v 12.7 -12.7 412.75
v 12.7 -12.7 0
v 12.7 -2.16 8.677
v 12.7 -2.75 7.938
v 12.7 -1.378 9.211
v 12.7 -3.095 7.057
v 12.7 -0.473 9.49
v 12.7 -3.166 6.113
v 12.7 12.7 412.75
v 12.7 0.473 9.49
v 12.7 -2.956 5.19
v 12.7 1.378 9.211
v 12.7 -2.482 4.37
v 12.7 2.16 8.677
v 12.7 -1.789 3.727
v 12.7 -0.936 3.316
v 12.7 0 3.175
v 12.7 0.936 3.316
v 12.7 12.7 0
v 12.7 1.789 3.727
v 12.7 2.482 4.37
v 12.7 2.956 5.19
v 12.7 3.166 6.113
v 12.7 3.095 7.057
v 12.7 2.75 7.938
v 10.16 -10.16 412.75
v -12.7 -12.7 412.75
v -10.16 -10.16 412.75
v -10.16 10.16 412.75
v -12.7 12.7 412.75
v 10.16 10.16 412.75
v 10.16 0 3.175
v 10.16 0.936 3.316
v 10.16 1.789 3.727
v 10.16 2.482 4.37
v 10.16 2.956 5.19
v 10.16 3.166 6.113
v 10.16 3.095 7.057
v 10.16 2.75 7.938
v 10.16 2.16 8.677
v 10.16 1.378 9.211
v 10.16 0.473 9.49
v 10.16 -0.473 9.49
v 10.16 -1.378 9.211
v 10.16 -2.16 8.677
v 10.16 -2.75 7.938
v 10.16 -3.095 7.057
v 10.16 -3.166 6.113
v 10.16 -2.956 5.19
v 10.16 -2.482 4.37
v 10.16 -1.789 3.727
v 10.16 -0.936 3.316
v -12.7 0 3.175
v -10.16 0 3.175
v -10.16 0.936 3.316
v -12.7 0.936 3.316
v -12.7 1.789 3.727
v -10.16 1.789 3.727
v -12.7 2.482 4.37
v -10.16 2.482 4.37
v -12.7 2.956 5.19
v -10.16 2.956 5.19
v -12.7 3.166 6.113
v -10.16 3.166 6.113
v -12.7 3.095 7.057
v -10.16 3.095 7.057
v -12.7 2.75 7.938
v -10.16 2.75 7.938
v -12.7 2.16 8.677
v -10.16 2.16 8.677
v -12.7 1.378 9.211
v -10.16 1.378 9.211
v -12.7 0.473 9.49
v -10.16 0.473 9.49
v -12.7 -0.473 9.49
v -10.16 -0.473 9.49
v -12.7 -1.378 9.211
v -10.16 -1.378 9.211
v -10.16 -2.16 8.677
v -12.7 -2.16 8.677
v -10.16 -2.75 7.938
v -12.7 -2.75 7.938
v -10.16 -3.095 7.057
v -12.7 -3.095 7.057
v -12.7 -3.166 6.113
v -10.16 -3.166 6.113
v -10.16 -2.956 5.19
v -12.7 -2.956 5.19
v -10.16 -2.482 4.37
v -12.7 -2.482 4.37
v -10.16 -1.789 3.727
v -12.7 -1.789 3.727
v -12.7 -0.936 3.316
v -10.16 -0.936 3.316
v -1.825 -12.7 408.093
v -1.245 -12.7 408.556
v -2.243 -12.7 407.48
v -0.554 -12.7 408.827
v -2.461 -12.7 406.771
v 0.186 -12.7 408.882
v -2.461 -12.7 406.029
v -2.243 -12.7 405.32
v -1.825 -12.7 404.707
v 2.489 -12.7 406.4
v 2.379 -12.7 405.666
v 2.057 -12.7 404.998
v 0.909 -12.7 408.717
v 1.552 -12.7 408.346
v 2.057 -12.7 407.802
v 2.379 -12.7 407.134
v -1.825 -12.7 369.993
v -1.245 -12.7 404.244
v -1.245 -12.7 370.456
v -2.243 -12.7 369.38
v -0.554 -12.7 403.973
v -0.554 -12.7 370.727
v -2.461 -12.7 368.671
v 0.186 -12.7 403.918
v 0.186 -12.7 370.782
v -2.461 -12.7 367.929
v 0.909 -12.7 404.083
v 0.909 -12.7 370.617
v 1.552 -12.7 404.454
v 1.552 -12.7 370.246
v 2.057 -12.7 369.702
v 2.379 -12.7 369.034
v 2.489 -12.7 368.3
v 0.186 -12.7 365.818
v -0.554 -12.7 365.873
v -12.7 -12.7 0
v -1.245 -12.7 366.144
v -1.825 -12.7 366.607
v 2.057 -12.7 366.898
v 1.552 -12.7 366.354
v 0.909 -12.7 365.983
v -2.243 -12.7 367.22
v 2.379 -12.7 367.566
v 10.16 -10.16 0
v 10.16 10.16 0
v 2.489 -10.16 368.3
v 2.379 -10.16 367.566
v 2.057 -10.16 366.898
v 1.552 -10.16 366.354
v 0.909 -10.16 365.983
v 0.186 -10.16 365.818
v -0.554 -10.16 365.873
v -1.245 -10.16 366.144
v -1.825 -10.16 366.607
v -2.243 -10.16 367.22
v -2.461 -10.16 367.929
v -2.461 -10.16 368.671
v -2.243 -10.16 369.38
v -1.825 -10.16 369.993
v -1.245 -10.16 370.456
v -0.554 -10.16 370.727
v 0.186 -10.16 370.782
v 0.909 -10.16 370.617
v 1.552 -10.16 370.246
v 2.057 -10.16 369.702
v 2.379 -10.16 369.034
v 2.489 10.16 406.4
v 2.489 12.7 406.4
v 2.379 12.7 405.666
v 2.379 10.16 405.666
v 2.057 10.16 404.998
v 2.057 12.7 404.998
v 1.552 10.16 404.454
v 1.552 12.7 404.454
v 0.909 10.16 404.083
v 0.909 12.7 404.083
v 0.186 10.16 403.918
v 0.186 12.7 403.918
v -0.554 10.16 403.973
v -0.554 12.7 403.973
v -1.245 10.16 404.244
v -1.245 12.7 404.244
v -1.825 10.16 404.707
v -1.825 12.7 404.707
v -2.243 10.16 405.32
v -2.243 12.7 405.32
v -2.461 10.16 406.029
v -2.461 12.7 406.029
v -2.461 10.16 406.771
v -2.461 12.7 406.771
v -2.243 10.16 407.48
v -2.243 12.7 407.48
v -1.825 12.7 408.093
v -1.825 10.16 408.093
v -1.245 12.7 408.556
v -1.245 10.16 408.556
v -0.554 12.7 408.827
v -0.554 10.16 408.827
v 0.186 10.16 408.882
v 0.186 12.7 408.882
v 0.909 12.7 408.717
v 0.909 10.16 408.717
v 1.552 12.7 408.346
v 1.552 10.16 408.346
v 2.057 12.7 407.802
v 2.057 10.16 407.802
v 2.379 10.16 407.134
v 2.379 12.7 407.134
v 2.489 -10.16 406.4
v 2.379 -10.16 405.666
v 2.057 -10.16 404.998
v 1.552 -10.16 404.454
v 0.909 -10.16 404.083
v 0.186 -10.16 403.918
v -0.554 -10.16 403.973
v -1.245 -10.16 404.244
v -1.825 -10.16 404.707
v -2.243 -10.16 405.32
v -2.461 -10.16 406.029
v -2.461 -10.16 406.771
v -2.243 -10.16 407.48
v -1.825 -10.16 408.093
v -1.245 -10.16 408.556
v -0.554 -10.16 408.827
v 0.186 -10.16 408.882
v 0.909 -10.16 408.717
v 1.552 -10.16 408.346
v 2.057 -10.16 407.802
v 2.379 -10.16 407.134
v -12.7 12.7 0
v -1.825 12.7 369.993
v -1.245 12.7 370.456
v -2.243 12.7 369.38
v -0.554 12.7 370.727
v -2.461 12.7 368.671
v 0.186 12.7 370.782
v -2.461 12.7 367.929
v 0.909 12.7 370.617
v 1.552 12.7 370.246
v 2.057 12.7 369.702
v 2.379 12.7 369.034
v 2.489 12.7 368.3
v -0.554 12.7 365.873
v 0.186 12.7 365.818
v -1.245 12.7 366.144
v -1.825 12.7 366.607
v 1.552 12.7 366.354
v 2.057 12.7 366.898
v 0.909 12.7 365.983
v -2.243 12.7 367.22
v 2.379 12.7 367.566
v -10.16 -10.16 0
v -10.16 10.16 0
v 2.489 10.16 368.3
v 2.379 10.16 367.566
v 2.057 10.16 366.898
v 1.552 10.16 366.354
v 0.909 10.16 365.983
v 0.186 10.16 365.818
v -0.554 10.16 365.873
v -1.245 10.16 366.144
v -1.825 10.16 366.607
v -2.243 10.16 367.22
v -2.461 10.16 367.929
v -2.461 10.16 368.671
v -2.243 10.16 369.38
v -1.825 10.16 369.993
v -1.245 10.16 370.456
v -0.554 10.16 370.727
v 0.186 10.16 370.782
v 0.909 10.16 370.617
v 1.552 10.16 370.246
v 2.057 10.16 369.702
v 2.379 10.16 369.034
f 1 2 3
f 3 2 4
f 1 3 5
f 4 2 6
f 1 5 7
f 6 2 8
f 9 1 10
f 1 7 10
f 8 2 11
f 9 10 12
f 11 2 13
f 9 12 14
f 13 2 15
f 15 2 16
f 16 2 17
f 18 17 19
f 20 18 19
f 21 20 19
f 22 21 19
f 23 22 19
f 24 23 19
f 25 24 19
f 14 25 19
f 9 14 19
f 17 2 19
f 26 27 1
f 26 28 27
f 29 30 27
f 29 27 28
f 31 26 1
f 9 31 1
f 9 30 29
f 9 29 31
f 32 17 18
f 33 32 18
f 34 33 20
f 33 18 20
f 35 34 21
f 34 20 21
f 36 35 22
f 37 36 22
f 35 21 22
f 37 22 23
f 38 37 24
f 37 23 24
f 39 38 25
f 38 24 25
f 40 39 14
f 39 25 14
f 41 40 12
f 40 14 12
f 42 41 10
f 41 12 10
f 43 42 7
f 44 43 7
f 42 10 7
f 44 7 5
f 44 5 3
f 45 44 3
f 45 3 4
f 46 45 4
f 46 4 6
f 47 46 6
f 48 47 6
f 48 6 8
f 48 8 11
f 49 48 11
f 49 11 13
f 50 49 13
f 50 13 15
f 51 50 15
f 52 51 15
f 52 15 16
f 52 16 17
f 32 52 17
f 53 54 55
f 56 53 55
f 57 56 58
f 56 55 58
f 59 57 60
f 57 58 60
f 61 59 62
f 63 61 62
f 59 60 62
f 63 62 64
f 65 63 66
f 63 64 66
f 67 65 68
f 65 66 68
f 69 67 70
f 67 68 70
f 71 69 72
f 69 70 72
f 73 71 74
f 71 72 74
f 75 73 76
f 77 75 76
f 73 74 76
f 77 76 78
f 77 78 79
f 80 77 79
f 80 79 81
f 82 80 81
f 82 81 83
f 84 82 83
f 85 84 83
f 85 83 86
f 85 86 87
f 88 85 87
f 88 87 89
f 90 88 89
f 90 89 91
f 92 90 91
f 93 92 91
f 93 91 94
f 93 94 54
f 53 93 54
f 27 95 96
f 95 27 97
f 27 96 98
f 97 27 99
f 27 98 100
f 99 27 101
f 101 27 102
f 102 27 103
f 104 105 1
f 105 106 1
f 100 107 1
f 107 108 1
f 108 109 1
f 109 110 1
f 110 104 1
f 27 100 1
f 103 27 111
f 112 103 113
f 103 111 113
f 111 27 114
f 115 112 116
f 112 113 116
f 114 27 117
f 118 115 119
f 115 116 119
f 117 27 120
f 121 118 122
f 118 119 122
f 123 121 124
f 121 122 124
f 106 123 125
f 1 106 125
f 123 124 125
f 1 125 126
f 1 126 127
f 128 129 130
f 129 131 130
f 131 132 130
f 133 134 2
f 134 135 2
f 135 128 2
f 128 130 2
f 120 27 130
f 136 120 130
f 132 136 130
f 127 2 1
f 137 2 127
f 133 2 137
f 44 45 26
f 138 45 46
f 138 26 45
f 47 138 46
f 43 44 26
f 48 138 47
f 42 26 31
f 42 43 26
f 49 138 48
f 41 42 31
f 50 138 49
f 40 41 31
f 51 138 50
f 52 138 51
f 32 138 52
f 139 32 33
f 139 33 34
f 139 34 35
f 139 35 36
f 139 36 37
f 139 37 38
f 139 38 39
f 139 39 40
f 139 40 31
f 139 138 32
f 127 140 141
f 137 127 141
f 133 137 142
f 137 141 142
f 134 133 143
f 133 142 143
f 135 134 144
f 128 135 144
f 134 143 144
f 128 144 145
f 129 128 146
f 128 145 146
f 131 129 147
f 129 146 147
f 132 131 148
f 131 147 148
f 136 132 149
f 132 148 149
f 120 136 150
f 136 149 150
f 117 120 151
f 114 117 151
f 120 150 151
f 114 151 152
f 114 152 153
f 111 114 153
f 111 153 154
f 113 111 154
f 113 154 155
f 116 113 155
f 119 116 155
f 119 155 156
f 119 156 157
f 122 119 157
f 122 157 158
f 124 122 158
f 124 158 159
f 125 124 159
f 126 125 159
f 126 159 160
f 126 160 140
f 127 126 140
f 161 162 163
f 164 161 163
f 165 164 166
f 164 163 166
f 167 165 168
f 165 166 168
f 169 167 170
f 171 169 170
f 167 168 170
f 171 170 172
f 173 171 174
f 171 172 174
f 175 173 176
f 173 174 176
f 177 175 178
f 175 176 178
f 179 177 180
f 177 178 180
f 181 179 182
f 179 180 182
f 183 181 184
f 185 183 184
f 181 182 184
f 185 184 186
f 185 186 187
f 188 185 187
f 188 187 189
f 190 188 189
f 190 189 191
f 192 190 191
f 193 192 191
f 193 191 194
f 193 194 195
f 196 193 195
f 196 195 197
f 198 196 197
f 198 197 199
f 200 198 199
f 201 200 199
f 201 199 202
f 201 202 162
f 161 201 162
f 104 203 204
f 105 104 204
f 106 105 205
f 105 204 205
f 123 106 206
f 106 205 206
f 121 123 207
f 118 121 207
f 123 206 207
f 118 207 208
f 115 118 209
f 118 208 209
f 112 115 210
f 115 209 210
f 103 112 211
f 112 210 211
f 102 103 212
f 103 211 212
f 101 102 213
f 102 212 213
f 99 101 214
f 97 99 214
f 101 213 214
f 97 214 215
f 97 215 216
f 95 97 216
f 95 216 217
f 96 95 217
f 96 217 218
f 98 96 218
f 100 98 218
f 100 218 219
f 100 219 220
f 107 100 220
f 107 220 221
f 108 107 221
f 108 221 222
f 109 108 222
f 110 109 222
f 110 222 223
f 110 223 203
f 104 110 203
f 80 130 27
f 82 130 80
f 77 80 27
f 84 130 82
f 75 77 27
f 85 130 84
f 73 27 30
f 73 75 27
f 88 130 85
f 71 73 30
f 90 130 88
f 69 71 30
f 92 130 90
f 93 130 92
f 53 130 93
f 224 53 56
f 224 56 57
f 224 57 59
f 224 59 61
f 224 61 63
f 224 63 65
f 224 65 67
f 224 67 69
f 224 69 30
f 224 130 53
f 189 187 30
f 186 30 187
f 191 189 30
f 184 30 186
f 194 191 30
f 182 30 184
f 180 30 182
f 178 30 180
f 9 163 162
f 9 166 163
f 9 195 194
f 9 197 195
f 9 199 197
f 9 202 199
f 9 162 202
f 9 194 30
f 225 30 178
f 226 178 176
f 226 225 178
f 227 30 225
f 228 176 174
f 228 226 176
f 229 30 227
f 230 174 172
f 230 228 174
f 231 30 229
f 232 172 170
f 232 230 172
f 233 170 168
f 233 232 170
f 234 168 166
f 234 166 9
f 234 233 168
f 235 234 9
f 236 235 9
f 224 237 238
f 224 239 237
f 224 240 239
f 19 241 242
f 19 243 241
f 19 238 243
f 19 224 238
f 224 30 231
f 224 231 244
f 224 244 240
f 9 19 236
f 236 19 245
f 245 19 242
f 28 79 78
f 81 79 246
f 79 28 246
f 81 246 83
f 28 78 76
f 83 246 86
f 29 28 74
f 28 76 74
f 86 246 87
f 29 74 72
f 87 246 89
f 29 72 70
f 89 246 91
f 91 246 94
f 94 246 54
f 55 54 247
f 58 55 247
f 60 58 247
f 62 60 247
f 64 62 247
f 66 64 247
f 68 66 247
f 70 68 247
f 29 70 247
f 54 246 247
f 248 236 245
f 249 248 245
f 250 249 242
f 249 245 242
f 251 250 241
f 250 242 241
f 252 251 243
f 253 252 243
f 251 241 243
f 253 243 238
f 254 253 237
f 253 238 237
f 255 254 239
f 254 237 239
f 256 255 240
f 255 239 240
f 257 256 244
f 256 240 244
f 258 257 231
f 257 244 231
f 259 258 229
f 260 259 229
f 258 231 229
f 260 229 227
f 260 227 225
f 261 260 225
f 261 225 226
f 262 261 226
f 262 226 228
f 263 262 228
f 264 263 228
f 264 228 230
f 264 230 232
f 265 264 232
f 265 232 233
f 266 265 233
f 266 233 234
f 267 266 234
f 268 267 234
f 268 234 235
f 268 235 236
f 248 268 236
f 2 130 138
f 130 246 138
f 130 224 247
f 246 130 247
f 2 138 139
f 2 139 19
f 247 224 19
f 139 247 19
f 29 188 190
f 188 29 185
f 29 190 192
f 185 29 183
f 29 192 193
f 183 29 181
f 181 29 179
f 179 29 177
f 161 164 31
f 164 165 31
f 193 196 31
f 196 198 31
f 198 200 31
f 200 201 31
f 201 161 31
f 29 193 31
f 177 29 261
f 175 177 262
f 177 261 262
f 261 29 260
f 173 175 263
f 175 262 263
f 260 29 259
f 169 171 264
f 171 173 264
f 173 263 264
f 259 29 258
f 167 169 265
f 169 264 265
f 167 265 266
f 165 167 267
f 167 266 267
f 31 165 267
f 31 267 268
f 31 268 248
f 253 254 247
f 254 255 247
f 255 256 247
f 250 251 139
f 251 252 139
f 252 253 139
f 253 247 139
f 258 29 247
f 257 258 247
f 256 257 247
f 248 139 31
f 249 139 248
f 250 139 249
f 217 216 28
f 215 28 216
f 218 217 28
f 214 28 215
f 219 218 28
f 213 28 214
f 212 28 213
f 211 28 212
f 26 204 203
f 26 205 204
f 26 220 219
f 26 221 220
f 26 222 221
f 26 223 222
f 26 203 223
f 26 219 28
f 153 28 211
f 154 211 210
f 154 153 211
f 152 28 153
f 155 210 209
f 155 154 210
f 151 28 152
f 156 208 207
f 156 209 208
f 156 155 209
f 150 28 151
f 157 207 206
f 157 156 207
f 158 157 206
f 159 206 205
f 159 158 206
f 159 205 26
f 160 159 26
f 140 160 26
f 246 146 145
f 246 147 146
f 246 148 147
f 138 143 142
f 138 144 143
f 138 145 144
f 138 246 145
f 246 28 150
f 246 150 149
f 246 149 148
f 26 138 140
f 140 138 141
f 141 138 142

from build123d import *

# Parameters (mm, degrees)
SKETCH1_W           = 25.4
SKETCH1_H           = 25.4
SKETCH1_W_2         = 20.32
SKETCH1_H_2         = 20.32
EXTRUDE_THIN1_DEPTH = 412.75
SKETCH2_R           = 2.4892
CUT_EXTRUDE1_DEPTH  = 26.4
SKETCH3_R           = 3.175
CUT_EXTRUDE2_DEPTH  = 26.4


with BuildPart() as part:
    # Sketch1 → Extrude-Thin1 (new body)
    with BuildSketch(Plane.XY):
        Rectangle(SKETCH1_W, SKETCH1_H)
        Rectangle(SKETCH1_W_2, SKETCH1_H_2, mode=Mode.SUBTRACT)
    extrude(amount=EXTRUDE_THIN1_DEPTH)

    # Sketch2 → Cut-Extrude1 (cut, through all)
    with BuildSketch(Plane(origin=(0, 12.7, 0), x_dir=(1, 0, 0), z_dir=(0, 1, 0))):
        with Locations((0, -406.4)):
            Circle(SKETCH2_R)
        with Locations((0, -368.3)):
            Circle(SKETCH2_R)
    extrude(amount=-CUT_EXTRUDE1_DEPTH, mode=Mode.SUBTRACT)

    # Sketch3 → Cut-Extrude2 (cut, through all)
    with BuildSketch(Plane(origin=(12.7, 0, 0), x_dir=(0, 0, -1), z_dir=(1, 0, 0))):
        with Locations((-6.35, 0)):
            Circle(SKETCH3_R)
    extrude(amount=-CUT_EXTRUDE2_DEPTH, mode=Mode.SUBTRACT)


solid = part.part
